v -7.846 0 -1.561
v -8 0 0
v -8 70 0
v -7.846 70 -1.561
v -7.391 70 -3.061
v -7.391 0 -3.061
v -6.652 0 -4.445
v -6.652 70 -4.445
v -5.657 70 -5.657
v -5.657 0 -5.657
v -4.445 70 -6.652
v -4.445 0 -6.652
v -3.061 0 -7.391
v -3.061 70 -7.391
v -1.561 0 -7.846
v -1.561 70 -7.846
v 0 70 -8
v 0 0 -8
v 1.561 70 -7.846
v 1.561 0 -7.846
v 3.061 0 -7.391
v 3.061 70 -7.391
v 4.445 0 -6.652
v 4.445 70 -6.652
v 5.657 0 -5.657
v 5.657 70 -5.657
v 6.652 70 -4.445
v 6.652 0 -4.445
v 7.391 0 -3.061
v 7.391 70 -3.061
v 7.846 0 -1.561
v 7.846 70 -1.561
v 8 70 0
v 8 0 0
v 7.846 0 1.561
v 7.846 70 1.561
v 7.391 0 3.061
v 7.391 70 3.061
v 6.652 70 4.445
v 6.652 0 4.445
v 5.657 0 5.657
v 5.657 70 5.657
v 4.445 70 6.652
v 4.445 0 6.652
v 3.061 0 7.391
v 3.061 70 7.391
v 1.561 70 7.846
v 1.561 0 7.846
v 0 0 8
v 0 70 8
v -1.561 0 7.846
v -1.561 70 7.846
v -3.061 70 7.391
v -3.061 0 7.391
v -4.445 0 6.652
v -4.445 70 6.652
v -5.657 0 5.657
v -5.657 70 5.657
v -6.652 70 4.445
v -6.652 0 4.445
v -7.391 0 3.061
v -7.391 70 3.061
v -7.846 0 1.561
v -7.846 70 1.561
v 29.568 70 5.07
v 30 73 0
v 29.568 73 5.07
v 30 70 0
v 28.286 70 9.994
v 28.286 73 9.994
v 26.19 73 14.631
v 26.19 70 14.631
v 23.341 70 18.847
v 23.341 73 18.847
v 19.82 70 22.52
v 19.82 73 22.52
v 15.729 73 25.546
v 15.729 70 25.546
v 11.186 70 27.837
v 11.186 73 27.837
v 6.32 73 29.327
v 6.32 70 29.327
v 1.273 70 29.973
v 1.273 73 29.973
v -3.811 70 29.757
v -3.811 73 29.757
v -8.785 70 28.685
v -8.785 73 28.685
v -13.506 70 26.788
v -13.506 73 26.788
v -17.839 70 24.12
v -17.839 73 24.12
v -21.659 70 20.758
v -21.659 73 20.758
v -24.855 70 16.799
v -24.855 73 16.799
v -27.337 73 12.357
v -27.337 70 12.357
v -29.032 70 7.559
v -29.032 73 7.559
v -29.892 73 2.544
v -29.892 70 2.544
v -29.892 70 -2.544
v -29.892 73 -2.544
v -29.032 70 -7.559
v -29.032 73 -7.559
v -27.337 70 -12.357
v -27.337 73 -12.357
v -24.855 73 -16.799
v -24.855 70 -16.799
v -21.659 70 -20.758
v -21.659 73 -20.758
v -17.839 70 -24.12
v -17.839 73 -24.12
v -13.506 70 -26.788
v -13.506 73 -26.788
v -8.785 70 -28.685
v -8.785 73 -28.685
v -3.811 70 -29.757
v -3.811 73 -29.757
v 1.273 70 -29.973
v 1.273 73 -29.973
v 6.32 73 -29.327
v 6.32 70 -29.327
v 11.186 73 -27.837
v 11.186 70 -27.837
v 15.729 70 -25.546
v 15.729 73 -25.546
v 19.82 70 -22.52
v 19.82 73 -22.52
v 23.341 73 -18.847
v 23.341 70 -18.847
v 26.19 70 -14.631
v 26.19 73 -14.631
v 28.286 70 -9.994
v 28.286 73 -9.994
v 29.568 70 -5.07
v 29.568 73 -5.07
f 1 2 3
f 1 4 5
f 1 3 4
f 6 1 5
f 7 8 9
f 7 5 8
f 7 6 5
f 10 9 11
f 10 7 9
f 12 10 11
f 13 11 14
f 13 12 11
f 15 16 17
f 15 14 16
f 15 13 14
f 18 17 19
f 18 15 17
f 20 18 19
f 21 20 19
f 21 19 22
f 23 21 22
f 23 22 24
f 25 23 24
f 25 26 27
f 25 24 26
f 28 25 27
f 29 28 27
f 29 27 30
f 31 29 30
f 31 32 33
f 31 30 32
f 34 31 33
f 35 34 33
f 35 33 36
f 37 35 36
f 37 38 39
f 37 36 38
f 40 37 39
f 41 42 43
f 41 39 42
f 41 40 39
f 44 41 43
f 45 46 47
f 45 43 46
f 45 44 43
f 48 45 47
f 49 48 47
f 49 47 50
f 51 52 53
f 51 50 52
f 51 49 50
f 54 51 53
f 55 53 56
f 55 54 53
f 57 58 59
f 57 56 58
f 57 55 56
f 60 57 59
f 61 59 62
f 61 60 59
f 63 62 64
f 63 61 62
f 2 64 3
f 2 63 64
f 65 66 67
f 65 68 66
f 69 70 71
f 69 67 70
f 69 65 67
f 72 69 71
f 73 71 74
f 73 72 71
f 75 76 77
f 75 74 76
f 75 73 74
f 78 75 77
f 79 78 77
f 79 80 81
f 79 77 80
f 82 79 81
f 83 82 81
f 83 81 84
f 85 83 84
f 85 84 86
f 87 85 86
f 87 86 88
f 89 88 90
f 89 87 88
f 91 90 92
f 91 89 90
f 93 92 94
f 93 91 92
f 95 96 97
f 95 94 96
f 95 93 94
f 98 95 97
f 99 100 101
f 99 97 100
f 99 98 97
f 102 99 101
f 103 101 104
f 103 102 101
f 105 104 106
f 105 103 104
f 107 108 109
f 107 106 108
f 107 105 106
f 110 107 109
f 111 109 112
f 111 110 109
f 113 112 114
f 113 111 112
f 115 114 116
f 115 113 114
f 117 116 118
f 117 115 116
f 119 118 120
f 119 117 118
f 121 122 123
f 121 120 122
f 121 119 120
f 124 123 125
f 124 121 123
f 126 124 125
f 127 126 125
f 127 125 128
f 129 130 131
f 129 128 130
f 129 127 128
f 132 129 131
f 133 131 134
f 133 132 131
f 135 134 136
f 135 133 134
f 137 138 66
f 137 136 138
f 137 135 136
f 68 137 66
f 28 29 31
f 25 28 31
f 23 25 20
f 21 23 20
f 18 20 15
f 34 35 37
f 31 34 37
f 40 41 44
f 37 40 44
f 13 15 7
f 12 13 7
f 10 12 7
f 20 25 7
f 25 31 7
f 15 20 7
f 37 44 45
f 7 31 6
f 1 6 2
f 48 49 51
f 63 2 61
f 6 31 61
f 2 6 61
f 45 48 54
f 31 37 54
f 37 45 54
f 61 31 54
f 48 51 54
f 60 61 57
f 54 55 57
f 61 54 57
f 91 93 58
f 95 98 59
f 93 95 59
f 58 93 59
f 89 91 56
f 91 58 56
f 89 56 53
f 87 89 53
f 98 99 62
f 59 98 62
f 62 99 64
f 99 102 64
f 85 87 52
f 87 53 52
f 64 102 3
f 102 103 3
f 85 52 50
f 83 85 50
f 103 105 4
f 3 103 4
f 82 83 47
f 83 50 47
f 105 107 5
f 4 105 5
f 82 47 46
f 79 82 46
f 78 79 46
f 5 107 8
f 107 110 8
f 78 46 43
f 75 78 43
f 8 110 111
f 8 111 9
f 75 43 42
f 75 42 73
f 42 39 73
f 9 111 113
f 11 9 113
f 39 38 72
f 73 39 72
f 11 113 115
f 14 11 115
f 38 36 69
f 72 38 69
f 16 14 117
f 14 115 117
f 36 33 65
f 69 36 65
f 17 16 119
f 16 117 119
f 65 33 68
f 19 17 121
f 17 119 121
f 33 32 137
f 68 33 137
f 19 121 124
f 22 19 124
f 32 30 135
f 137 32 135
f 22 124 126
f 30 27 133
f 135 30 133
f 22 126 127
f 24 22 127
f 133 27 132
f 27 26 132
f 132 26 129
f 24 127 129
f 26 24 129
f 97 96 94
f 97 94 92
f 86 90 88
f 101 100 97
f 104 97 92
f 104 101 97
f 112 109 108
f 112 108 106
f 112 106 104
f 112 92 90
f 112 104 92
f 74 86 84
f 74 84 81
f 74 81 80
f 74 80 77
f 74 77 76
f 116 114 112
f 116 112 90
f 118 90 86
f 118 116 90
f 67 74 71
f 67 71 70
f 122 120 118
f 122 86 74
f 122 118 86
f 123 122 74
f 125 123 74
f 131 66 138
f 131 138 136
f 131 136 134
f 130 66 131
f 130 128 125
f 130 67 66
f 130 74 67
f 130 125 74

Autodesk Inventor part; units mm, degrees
ref_plane "YZ Plane" through (0, 0, 0) normal (1, 0, 0) x (0, 1, 0)
ref_plane "XZ Plane" through (0, 0, 0) normal (0, 1, 0) x (-1, 0, 0)
ref_plane "XY Plane" through (0, 0, 0) normal (0, 0, 1) x (1, 0, 0)
sketch "スケッチ1" plane through (0, 0, 0) normal (0, 1, 0) x (-1, 0, 0)
  circle A0 centre (0, 0) radius 8
  dimension "d0" = 16
extrude "押し出し1" add sketch "スケッチ1" along normal blind 70
sketch "スケッチ2" plane through (0, 70, 0) normal (0, 1, 0) x (1, 0, 0)
  circle A0 centre (0, 0) radius 8 projected
sketch "スケッチ3" plane through (0, 70, 0) normal (0, 1, 0) x (1, 0, 0)
  circle A0 centre (0, 0) radius 8 projected
  circle A1 centre (0, 0) radius 30
  dimension "d3" = 60
extrude "押し出し2" add sketch "スケッチ3" along normal blind 3
extrude "押し出し3" add sketch "スケッチ2" along normal blind 3
properties part number "知能ロボコン大砲４"
